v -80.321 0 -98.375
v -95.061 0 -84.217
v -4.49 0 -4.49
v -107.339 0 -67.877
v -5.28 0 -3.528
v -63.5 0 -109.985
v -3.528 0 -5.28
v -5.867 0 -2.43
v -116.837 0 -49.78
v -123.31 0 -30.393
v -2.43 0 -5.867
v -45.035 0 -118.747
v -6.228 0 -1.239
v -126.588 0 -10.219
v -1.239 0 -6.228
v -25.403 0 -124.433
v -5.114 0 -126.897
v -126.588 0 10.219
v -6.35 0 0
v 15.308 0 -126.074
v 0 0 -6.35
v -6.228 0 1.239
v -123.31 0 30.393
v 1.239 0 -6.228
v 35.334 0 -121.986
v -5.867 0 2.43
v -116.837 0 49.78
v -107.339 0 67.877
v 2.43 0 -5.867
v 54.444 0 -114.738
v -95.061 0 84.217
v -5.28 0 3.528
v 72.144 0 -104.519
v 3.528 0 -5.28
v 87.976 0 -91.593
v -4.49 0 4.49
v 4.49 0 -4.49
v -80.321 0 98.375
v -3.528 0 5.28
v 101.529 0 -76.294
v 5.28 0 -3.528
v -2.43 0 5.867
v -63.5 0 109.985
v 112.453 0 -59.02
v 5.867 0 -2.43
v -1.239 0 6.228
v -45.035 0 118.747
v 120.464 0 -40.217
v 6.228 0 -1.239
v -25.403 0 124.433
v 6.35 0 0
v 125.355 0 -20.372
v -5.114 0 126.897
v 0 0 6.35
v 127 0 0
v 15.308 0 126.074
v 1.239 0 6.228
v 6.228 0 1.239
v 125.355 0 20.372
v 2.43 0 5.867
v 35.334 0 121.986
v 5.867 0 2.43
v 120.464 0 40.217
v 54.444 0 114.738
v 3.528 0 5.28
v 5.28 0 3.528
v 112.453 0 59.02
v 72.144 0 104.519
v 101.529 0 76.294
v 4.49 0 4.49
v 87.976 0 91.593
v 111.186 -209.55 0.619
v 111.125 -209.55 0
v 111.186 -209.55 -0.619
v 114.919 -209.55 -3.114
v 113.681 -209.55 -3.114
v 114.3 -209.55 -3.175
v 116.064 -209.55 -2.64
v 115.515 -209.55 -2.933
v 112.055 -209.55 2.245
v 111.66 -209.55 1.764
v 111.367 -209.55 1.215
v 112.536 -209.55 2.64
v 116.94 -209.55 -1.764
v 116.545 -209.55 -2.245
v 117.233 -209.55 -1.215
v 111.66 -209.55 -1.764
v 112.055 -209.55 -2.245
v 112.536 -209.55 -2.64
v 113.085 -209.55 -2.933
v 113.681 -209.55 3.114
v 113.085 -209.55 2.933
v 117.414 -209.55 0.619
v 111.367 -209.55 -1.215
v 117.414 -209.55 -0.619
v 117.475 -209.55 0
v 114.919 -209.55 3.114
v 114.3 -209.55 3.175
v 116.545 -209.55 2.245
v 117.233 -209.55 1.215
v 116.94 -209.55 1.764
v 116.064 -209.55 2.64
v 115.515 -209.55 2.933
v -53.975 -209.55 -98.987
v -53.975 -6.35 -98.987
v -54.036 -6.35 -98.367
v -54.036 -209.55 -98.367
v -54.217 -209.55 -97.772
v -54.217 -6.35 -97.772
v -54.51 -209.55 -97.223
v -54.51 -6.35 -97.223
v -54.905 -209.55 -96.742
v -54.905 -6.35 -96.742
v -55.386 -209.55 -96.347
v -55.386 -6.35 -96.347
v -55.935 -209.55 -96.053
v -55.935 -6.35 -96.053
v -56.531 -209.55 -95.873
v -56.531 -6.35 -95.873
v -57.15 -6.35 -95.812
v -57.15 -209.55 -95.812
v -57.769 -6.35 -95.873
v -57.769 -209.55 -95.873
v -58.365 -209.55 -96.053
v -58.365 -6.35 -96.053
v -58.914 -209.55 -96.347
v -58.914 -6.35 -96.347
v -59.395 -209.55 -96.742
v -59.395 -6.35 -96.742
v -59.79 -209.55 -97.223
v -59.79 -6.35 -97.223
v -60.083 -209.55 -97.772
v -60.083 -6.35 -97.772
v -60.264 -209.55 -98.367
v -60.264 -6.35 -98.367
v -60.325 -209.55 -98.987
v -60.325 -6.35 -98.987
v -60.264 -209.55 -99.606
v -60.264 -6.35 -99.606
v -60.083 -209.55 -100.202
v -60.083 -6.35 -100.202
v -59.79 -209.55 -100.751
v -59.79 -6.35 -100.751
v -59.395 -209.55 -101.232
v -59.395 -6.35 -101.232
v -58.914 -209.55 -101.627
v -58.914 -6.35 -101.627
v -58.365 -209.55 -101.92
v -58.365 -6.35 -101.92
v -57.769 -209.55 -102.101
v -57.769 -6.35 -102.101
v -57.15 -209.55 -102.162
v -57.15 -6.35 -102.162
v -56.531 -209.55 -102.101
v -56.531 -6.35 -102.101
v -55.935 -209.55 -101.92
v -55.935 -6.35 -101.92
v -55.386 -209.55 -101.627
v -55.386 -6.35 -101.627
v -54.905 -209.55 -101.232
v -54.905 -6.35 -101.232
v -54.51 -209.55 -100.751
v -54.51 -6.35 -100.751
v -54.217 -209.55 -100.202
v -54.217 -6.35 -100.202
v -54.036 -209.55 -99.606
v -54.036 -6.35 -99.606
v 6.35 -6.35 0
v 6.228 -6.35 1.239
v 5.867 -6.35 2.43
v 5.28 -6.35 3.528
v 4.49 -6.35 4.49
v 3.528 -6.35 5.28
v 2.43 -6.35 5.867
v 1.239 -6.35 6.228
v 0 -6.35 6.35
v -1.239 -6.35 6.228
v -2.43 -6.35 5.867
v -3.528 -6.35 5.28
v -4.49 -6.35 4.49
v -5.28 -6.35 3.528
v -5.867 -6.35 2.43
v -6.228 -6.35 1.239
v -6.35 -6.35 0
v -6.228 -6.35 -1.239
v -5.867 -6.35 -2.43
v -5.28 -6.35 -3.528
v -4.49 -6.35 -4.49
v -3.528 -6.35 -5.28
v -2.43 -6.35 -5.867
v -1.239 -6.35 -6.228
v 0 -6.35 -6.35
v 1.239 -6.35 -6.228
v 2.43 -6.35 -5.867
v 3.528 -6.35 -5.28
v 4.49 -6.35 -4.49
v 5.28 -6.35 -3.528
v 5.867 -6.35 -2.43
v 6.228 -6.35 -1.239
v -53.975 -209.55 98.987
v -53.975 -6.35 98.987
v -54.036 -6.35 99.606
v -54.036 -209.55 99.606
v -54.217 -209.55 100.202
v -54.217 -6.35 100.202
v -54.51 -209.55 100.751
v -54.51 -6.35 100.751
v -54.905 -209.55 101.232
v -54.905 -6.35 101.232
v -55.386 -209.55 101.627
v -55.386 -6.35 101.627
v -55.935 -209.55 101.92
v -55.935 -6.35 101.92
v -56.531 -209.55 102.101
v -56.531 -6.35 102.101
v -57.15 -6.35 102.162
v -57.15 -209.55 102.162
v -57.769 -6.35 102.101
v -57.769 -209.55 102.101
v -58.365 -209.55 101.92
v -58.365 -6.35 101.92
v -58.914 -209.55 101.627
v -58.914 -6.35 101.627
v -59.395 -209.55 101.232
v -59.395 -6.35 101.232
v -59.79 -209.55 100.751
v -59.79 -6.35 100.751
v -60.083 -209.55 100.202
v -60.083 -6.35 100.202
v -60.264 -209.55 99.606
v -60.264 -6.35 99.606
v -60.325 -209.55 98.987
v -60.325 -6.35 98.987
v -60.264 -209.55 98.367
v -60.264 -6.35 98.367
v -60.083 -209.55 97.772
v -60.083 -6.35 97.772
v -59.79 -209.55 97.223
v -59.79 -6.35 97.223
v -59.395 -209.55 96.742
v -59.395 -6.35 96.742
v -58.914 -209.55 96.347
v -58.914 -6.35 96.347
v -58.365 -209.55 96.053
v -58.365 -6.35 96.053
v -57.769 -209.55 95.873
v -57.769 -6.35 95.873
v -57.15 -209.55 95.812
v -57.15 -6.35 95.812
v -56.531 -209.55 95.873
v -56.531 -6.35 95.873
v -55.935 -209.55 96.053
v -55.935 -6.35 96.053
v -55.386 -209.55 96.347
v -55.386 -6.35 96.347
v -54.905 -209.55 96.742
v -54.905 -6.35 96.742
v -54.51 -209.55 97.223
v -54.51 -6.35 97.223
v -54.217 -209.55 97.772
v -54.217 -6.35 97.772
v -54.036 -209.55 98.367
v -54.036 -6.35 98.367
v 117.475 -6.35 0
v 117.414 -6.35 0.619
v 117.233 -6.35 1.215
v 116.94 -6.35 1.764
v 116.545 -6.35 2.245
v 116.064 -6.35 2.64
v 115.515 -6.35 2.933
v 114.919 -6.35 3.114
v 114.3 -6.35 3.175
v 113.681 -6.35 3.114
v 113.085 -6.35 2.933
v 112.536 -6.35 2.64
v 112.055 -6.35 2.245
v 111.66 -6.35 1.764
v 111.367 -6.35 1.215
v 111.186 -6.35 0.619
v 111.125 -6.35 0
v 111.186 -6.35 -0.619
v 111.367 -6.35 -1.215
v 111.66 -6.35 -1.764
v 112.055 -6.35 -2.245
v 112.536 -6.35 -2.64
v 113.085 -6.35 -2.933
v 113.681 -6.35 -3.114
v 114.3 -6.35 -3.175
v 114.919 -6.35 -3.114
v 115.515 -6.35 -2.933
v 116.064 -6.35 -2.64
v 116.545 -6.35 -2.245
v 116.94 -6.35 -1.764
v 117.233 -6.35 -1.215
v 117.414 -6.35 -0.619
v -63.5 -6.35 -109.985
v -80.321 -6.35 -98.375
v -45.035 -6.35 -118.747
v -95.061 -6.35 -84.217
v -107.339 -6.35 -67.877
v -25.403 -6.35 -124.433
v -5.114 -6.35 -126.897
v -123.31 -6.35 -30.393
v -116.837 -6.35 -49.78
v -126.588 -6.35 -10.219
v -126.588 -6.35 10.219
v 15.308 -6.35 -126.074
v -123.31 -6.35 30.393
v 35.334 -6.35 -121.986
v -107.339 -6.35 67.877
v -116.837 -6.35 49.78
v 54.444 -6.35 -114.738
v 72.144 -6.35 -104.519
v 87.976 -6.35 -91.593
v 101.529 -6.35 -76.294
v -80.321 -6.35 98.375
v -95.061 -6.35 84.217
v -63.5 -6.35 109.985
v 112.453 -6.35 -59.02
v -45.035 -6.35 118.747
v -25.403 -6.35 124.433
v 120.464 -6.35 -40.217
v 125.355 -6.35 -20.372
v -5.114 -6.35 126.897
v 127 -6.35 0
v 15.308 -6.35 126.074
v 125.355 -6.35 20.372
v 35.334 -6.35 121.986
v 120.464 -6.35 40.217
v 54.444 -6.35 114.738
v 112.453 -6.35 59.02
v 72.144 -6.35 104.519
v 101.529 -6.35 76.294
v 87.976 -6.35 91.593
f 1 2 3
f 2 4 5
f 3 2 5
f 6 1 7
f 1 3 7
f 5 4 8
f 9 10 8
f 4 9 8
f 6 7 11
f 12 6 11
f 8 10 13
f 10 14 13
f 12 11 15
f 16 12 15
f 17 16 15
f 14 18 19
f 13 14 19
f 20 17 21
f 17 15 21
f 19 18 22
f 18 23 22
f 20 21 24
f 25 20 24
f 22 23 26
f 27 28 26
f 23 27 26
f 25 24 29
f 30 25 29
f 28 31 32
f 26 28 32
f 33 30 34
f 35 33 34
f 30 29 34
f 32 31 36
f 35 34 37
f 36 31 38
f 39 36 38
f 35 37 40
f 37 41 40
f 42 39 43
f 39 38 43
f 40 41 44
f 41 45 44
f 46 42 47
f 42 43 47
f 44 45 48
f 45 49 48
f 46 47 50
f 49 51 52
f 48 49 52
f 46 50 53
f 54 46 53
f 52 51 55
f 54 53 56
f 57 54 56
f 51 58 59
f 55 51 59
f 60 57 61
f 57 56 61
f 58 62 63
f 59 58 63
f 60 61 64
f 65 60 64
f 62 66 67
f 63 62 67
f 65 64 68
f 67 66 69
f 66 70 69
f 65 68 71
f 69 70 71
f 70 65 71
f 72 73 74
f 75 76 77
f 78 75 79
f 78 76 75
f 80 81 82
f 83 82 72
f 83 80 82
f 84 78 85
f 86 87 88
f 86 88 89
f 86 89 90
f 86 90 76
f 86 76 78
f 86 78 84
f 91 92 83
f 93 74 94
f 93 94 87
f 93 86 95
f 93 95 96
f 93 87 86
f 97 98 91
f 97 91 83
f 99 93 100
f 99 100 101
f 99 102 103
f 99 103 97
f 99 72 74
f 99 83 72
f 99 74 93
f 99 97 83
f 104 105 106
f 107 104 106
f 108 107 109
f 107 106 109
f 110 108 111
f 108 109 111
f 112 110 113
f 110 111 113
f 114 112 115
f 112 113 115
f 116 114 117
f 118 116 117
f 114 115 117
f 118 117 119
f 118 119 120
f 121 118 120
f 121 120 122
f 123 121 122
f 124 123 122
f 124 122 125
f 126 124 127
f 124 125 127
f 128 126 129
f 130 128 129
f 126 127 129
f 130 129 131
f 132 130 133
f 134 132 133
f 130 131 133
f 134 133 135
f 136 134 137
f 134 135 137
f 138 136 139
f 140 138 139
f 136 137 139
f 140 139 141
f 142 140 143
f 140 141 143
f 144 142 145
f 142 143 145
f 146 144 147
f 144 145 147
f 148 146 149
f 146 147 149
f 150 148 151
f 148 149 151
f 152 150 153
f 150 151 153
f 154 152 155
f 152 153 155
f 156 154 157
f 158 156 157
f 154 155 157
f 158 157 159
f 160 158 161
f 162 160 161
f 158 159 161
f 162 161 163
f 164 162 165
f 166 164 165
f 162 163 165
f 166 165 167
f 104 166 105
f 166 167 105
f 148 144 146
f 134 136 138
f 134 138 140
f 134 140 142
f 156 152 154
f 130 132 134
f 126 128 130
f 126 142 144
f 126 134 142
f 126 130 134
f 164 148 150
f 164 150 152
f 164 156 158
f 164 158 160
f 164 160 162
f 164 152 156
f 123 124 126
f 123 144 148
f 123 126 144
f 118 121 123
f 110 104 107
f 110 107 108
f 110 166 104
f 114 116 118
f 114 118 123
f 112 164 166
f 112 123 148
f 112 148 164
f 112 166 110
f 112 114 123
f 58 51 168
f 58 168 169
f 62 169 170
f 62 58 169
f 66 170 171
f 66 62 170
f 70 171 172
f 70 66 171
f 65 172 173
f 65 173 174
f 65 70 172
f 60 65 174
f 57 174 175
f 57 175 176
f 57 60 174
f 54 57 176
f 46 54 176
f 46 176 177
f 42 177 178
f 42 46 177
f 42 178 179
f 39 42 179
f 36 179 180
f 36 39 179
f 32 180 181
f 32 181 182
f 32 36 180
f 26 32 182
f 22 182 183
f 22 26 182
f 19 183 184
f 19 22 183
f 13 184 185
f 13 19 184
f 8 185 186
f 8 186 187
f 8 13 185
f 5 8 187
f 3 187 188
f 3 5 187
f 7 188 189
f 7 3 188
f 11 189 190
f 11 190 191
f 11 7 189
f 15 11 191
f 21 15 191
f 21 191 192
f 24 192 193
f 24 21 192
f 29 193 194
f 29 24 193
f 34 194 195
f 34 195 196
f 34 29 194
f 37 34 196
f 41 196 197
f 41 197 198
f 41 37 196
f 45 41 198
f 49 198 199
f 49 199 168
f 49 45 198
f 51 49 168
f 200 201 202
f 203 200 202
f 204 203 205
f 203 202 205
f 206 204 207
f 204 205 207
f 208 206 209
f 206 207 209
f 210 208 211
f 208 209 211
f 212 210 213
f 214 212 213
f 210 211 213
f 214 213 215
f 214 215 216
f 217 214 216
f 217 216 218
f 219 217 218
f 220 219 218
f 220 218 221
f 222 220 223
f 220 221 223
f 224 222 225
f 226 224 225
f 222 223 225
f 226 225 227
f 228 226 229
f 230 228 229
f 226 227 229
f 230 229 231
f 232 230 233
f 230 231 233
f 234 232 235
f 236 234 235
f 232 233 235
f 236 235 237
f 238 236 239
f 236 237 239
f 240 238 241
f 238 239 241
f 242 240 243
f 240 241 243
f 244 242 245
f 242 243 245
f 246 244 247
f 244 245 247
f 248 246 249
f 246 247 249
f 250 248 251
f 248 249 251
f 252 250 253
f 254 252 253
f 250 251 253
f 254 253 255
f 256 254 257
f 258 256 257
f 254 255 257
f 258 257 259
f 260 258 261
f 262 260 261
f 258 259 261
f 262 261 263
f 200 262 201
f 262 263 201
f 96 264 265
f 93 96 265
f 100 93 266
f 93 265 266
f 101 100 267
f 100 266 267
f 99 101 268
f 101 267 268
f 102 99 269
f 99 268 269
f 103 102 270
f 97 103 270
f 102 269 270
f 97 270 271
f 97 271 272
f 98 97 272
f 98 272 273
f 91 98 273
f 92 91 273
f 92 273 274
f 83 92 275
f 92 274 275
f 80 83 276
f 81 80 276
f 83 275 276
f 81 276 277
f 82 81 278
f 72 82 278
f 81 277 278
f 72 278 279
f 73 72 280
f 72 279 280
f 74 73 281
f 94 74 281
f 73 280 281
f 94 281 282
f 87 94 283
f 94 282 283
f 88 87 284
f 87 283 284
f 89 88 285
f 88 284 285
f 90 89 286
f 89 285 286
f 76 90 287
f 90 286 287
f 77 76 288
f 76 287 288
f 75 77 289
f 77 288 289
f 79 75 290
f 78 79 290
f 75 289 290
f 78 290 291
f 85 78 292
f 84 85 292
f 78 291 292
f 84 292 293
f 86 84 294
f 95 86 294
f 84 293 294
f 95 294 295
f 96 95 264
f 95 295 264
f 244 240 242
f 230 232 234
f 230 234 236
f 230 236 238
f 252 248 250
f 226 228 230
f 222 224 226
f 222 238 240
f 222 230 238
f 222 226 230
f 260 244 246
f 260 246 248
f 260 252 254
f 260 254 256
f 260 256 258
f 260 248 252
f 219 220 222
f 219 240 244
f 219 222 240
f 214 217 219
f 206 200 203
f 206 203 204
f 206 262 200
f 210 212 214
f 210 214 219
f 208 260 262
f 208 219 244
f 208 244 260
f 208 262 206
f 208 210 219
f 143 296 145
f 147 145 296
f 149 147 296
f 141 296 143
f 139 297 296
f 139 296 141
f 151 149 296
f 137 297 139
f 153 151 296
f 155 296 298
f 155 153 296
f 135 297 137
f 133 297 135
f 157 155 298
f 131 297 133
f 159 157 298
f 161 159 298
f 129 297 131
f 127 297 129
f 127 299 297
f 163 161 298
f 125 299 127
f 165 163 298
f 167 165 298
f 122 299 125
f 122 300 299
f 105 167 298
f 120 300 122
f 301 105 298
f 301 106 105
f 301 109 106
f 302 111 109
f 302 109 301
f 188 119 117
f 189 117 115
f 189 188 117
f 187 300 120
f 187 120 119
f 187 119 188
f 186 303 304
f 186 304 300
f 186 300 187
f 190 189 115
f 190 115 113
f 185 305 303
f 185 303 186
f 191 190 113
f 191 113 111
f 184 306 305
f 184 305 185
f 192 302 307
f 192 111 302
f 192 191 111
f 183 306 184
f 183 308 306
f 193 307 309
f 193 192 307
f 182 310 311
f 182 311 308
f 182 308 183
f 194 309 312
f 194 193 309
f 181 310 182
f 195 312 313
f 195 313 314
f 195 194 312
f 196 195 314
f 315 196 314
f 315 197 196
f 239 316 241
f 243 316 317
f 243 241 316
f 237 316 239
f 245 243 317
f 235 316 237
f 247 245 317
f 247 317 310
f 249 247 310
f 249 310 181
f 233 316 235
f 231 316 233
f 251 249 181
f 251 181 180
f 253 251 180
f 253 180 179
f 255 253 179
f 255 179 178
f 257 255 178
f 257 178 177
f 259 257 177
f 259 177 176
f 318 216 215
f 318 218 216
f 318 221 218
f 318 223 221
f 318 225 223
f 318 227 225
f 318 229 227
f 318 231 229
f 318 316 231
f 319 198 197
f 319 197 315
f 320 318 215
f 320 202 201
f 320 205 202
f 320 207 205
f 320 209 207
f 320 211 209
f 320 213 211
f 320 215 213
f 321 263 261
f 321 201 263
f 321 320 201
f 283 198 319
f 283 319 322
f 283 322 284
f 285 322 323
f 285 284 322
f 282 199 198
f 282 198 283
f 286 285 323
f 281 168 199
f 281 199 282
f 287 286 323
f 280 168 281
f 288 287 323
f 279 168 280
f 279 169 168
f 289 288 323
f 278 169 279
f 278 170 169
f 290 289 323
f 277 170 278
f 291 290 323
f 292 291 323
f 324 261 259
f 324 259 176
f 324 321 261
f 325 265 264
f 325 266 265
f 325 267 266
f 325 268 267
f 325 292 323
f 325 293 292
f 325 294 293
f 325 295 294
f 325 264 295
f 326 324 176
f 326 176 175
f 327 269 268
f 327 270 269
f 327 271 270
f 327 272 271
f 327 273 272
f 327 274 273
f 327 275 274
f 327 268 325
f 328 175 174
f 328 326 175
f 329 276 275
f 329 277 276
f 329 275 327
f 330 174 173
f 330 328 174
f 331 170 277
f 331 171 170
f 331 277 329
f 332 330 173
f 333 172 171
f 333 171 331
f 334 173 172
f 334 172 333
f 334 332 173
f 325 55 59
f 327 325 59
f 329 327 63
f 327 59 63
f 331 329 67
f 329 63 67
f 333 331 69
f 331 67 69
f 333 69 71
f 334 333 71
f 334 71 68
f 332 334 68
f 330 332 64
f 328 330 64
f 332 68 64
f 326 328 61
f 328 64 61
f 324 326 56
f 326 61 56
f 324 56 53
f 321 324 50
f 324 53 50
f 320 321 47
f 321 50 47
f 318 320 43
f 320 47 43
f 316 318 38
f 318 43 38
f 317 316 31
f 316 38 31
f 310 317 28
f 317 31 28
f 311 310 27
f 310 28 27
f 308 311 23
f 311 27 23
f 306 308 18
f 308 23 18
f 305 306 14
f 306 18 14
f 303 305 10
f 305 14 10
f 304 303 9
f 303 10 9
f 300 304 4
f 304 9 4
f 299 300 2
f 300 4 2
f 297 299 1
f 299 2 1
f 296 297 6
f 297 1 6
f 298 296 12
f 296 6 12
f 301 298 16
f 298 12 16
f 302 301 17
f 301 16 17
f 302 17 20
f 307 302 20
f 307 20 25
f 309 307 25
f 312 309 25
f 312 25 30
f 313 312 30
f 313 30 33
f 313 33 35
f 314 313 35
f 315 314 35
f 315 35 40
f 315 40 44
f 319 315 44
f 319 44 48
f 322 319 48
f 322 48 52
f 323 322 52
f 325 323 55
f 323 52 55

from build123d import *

# Parameters (mm, degrees)
F0_R     = 127
F0_R_2   = 6.35
F1_DEPTH = 6.35
F2_R     = 3.175
F3_DEPTH = 203.2


with BuildPart() as f1:
    # F0 (on Front) → F1 (new body)
    with BuildSketch(Plane.XZ):
        Circle(F0_R)
        Circle(F0_R_2, mode=Mode.SUBTRACT)
    extrude(amount=F1_DEPTH)

    # F2 (on face) → F3 (join)
    with BuildSketch(Plane.XZ.offset(6.35)):
        with Locations((114.3, 0)):
            Circle(F2_R)
        with Locations((-57.15, 98.986704)):
            Circle(F2_R)
        with Locations((-57.15, -98.986704)):
            Circle(F2_R)
    extrude(amount=F3_DEPTH)


solid = f1.part
